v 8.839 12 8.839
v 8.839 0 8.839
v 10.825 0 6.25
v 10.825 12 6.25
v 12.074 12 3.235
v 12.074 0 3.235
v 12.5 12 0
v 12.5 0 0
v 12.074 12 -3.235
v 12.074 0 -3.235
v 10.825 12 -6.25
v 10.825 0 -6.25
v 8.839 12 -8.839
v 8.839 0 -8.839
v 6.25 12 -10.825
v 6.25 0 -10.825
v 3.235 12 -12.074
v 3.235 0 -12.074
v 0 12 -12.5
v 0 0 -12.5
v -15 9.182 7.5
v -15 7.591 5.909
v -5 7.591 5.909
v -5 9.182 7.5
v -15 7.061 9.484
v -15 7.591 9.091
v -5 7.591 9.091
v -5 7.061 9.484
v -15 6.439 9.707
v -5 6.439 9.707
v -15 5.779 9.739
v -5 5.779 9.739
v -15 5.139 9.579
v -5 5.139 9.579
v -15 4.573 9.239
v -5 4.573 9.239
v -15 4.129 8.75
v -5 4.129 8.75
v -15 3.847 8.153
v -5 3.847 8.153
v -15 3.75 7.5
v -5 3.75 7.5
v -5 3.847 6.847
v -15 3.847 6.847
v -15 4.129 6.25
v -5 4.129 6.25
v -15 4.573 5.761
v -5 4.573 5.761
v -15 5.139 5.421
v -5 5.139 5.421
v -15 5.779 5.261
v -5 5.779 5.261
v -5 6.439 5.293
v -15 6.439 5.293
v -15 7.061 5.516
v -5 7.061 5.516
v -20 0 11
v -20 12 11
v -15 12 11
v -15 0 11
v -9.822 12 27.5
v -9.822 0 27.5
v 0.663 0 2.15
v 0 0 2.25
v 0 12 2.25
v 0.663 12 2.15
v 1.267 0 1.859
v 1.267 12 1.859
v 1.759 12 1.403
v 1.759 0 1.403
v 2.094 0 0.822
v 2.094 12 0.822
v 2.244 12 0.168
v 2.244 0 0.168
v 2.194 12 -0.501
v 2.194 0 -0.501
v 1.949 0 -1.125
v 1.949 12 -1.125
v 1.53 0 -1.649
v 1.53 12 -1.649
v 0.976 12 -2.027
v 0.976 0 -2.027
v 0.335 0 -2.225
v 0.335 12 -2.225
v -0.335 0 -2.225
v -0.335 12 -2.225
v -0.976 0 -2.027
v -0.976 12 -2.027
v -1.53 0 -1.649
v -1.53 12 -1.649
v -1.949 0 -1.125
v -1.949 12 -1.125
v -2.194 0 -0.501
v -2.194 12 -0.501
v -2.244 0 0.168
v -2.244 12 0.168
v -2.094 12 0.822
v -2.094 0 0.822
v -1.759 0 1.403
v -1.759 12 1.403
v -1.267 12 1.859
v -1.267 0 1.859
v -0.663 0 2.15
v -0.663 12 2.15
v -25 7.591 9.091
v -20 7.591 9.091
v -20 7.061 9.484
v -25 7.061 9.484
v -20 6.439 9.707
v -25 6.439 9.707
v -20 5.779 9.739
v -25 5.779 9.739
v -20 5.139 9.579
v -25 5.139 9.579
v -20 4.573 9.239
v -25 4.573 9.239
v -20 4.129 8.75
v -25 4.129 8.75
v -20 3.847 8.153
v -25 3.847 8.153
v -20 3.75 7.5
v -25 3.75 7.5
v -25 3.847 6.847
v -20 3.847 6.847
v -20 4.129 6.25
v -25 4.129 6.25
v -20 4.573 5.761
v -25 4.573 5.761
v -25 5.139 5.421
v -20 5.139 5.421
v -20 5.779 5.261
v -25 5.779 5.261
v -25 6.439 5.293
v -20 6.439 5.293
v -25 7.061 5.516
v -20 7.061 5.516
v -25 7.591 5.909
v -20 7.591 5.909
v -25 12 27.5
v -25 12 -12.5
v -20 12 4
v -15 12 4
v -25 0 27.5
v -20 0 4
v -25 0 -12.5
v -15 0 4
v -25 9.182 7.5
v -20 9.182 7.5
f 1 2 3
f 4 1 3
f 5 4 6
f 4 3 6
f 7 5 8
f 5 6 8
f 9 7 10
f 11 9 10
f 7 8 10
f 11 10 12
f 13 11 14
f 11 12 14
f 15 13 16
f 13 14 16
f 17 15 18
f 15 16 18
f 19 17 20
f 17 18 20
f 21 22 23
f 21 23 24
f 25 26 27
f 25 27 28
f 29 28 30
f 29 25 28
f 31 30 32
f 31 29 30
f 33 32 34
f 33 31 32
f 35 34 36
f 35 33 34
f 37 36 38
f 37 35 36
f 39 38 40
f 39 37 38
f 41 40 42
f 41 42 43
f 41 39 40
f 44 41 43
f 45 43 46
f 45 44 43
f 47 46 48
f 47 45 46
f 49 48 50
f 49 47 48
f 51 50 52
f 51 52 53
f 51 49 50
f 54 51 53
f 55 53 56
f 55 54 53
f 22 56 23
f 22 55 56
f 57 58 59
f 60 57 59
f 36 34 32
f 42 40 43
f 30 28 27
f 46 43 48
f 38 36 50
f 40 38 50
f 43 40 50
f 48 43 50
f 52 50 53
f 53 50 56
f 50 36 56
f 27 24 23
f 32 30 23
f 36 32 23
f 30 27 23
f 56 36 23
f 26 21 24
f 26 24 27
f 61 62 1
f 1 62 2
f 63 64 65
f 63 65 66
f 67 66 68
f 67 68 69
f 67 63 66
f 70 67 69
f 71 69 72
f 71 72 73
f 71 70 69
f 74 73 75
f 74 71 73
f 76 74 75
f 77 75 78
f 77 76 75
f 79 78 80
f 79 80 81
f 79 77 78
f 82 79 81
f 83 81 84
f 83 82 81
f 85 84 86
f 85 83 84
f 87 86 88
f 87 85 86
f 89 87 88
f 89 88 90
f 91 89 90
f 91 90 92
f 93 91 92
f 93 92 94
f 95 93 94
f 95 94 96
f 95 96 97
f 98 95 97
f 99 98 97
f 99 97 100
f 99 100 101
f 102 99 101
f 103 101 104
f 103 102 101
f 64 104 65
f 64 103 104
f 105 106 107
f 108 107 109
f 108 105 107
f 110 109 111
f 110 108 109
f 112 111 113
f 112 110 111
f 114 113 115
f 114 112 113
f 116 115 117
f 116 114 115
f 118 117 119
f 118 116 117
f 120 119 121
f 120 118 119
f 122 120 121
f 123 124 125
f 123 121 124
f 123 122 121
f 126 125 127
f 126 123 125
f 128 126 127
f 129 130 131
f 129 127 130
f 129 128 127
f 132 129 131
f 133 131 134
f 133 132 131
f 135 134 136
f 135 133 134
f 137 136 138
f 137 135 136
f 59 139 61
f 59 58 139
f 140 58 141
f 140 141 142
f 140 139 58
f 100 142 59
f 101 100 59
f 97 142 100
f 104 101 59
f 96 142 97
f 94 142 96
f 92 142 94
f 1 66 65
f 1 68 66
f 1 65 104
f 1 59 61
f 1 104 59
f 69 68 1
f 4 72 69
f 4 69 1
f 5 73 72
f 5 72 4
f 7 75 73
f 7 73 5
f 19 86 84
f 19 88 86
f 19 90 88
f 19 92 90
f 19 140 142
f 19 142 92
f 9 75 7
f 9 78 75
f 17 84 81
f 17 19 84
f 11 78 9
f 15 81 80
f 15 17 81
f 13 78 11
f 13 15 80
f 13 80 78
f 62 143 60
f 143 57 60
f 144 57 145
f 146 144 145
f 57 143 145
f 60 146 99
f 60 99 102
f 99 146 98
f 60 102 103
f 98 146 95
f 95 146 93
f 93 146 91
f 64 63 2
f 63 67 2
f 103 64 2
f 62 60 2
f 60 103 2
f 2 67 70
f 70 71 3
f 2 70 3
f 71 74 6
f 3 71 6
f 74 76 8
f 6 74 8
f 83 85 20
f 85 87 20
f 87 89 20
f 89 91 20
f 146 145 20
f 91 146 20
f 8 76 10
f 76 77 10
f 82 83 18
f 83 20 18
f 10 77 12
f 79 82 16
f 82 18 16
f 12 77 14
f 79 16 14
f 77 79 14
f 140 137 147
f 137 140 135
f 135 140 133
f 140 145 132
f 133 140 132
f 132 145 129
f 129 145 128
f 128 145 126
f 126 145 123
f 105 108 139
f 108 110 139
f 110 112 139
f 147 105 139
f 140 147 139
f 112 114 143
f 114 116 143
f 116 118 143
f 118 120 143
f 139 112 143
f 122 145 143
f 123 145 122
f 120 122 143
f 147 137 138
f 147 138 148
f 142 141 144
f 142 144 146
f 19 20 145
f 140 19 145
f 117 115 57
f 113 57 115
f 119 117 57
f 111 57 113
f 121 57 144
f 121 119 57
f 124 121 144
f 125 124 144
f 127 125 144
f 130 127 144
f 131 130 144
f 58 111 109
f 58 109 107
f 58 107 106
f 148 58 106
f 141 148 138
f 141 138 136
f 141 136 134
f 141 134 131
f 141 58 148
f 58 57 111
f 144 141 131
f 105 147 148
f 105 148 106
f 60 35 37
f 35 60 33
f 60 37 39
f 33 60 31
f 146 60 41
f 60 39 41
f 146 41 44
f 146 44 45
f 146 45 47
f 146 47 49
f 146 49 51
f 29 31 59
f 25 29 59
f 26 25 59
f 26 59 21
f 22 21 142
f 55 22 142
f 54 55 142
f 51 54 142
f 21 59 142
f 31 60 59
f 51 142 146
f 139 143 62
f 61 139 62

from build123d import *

# Parameters (mm, degrees)
SKETCH1_R           = 2.25
BOSS_EXTRUDE1_DEPTH = 12
CUT_EXTRUDE1_DEPTH  = 20
CUT_EXTRUDE2_REACH  = 41.054
SKETCH3_W           = 5
SKETCH3_H           = 7


with BuildPart() as part:
    # Sketch1 → Boss-Extrude1 (new body)
    with BuildSketch(Plane(origin=(0, 0, 0), x_dir=(1, 0, 0), z_dir=(0, 1, 0))):
        with BuildLine():
            Line((0, 12.5), (-15, 12.5))
            Line((-15, 12.5), (-25, 12.5))
            Line((-25, 12.5), (-25, -27.5))
            Line((-25, -27.5), (-9.82233047, -27.5))
            Line((-9.82233047, -27.5), (8.838834765, -8.838834765))
            ThreePointArc((8.838834765, -8.838834765), (11.548494156, 4.783542905), (0, 12.5))
        make_face()
        with Locations(Location((0, 0, 0), (0, 0, 270))):
            Circle(SKETCH1_R, mode=Mode.SUBTRACT)
    extrude(amount=BOSS_EXTRUDE1_DEPTH)

    # Sketch2 → Cut-Extrude1 (cut)
    with BuildSketch(Plane.ZY.offset(25)):
        with BuildLine():
            Line((5.909009742, 7.590990258), (7.5, 9.181980515))
            Line((7.5, 9.181980515), (9.090990258, 7.590990258))
            ThreePointArc((9.090990258, 7.590990258), (7.5, 3.75), (5.909009742, 7.590990258))
        make_face()
    extrude(amount=-CUT_EXTRUDE1_DEPTH, mode=Mode.SUBTRACT)

    # Sketch3 → Cut-Extrude2 (cut, up to next)
    with BuildSketch(Plane(origin=(0, 12, 0), x_dir=(1, 0, 0), z_dir=(0, 1, 0)), mode=Mode.PRIVATE) as cut_extrude2_sk1:
        with Locations((-17.5, -7.5)):
            Rectangle(SKETCH3_W, SKETCH3_H)
    cut_extrude2_tool1 = extrude(cut_extrude2_sk1.sketch, amount=-CUT_EXTRUDE2_REACH, mode=Mode.PRIVATE) & part.part
    add(cut_extrude2_tool1.solids().sort_by_distance((-17.5, 12, 7.5))[0], mode=Mode.SUBTRACT)


solid = part.part
